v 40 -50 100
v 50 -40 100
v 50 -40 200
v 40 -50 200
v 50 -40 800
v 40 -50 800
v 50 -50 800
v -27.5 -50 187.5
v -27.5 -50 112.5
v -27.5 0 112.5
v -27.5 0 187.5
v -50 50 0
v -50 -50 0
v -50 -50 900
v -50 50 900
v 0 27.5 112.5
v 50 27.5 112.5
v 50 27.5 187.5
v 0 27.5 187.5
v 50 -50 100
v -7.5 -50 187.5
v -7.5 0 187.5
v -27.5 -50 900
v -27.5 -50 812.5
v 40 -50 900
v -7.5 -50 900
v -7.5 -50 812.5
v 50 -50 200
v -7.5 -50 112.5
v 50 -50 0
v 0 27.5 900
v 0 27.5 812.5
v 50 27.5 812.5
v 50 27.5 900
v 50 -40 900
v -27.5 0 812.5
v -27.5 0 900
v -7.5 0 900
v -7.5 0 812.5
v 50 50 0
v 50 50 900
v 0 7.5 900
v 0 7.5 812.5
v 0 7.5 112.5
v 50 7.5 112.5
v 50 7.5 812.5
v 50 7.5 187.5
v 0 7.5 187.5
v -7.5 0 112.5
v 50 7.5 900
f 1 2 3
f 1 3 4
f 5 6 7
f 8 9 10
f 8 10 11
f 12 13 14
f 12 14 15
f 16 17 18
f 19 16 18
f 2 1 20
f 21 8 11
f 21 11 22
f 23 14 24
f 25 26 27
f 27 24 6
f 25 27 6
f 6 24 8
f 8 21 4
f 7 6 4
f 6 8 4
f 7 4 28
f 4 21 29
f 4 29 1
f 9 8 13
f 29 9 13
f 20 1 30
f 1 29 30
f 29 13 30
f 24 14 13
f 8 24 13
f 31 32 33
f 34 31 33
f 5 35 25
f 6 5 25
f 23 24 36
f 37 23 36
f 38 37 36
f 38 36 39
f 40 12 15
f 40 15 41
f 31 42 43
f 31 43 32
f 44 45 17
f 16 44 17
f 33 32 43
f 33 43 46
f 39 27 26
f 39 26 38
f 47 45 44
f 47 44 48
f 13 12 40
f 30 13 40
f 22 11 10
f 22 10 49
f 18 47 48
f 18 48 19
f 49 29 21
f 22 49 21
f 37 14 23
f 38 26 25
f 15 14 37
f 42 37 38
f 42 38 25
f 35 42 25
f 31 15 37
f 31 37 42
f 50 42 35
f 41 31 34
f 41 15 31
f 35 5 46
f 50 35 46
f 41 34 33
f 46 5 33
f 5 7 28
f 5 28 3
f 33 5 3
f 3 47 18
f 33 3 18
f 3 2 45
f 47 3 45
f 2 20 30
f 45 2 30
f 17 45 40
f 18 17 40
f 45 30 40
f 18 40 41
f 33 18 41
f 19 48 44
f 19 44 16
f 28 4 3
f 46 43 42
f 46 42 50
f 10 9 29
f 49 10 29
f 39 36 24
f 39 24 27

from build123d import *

# Parameters (mm, degrees)
F1_W      = 100
F1_H      = 100
F3_DEPTH  = 900
F4_W      = 20
F4_H      = 75
F5_DEPTH  = 50
F6_W      = 20
F6_H      = 75
F7_DEPTH  = 50
F9_DEPTH  = 100
F12_W     = 50
F12_H     = 20
F12_W_2   = 20
F12_H_2   = 50
F13_DEPTH = 87.5
F15_DEPTH = 100


with BuildPart() as f3:
    # F1 (on Top) → F3 (new body)
    with BuildSketch(Plane.XY):
        Rectangle(F1_W, F1_H)
    extrude(amount=F3_DEPTH)

    # F4 (on face) → F5 (cut)
    with BuildSketch(Plane.YZ.offset(50)):
        with Locations((17.5, 150)):
            Rectangle(F4_W, F4_H)
    extrude(amount=-F5_DEPTH, mode=Mode.SUBTRACT)

    # F6 (on face) → F7 (cut)
    with BuildSketch(Plane.XZ.offset(50)):
        with Locations((-17.5, 150)):
            Rectangle(F6_W, F6_H)
    extrude(amount=-F7_DEPTH, mode=Mode.SUBTRACT)


with BuildPart() as f9:
    # F8 (on Top) → F9 (new body)
    with BuildSketch(Plane.XY):
        Polygon((50, -40), (40, -50), (50, -50), align=None)
    extrude(amount=F9_DEPTH)


with BuildPart() as f9_1:
    # F10: moved
    add(f9.part.moved(Location((0, 0, 100))))


with BuildPart() as f3_1:
    add(f3.part)

    # F11: cut F9
    add(f9_1.part, mode=Mode.SUBTRACT)

    # F12 (on face) → F13 (cut)
    with BuildSketch(Plane.XY.offset(900)):
        with Locations((25, 17.5)):
            Rectangle(F12_W, F12_H)
        with Locations((-17.5, -25)):
            Rectangle(F12_W_2, F12_H_2)
    extrude(amount=-F13_DEPTH, mode=Mode.SUBTRACT)

    # F12 (on face) → F15 (cut)
    with BuildSketch(Plane.XY.offset(900)):
        Polygon((50, -50), (50, -40), (40, -50), align=None)
    extrude(amount=-F15_DEPTH, mode=Mode.SUBTRACT)


solid = f3_1.part
